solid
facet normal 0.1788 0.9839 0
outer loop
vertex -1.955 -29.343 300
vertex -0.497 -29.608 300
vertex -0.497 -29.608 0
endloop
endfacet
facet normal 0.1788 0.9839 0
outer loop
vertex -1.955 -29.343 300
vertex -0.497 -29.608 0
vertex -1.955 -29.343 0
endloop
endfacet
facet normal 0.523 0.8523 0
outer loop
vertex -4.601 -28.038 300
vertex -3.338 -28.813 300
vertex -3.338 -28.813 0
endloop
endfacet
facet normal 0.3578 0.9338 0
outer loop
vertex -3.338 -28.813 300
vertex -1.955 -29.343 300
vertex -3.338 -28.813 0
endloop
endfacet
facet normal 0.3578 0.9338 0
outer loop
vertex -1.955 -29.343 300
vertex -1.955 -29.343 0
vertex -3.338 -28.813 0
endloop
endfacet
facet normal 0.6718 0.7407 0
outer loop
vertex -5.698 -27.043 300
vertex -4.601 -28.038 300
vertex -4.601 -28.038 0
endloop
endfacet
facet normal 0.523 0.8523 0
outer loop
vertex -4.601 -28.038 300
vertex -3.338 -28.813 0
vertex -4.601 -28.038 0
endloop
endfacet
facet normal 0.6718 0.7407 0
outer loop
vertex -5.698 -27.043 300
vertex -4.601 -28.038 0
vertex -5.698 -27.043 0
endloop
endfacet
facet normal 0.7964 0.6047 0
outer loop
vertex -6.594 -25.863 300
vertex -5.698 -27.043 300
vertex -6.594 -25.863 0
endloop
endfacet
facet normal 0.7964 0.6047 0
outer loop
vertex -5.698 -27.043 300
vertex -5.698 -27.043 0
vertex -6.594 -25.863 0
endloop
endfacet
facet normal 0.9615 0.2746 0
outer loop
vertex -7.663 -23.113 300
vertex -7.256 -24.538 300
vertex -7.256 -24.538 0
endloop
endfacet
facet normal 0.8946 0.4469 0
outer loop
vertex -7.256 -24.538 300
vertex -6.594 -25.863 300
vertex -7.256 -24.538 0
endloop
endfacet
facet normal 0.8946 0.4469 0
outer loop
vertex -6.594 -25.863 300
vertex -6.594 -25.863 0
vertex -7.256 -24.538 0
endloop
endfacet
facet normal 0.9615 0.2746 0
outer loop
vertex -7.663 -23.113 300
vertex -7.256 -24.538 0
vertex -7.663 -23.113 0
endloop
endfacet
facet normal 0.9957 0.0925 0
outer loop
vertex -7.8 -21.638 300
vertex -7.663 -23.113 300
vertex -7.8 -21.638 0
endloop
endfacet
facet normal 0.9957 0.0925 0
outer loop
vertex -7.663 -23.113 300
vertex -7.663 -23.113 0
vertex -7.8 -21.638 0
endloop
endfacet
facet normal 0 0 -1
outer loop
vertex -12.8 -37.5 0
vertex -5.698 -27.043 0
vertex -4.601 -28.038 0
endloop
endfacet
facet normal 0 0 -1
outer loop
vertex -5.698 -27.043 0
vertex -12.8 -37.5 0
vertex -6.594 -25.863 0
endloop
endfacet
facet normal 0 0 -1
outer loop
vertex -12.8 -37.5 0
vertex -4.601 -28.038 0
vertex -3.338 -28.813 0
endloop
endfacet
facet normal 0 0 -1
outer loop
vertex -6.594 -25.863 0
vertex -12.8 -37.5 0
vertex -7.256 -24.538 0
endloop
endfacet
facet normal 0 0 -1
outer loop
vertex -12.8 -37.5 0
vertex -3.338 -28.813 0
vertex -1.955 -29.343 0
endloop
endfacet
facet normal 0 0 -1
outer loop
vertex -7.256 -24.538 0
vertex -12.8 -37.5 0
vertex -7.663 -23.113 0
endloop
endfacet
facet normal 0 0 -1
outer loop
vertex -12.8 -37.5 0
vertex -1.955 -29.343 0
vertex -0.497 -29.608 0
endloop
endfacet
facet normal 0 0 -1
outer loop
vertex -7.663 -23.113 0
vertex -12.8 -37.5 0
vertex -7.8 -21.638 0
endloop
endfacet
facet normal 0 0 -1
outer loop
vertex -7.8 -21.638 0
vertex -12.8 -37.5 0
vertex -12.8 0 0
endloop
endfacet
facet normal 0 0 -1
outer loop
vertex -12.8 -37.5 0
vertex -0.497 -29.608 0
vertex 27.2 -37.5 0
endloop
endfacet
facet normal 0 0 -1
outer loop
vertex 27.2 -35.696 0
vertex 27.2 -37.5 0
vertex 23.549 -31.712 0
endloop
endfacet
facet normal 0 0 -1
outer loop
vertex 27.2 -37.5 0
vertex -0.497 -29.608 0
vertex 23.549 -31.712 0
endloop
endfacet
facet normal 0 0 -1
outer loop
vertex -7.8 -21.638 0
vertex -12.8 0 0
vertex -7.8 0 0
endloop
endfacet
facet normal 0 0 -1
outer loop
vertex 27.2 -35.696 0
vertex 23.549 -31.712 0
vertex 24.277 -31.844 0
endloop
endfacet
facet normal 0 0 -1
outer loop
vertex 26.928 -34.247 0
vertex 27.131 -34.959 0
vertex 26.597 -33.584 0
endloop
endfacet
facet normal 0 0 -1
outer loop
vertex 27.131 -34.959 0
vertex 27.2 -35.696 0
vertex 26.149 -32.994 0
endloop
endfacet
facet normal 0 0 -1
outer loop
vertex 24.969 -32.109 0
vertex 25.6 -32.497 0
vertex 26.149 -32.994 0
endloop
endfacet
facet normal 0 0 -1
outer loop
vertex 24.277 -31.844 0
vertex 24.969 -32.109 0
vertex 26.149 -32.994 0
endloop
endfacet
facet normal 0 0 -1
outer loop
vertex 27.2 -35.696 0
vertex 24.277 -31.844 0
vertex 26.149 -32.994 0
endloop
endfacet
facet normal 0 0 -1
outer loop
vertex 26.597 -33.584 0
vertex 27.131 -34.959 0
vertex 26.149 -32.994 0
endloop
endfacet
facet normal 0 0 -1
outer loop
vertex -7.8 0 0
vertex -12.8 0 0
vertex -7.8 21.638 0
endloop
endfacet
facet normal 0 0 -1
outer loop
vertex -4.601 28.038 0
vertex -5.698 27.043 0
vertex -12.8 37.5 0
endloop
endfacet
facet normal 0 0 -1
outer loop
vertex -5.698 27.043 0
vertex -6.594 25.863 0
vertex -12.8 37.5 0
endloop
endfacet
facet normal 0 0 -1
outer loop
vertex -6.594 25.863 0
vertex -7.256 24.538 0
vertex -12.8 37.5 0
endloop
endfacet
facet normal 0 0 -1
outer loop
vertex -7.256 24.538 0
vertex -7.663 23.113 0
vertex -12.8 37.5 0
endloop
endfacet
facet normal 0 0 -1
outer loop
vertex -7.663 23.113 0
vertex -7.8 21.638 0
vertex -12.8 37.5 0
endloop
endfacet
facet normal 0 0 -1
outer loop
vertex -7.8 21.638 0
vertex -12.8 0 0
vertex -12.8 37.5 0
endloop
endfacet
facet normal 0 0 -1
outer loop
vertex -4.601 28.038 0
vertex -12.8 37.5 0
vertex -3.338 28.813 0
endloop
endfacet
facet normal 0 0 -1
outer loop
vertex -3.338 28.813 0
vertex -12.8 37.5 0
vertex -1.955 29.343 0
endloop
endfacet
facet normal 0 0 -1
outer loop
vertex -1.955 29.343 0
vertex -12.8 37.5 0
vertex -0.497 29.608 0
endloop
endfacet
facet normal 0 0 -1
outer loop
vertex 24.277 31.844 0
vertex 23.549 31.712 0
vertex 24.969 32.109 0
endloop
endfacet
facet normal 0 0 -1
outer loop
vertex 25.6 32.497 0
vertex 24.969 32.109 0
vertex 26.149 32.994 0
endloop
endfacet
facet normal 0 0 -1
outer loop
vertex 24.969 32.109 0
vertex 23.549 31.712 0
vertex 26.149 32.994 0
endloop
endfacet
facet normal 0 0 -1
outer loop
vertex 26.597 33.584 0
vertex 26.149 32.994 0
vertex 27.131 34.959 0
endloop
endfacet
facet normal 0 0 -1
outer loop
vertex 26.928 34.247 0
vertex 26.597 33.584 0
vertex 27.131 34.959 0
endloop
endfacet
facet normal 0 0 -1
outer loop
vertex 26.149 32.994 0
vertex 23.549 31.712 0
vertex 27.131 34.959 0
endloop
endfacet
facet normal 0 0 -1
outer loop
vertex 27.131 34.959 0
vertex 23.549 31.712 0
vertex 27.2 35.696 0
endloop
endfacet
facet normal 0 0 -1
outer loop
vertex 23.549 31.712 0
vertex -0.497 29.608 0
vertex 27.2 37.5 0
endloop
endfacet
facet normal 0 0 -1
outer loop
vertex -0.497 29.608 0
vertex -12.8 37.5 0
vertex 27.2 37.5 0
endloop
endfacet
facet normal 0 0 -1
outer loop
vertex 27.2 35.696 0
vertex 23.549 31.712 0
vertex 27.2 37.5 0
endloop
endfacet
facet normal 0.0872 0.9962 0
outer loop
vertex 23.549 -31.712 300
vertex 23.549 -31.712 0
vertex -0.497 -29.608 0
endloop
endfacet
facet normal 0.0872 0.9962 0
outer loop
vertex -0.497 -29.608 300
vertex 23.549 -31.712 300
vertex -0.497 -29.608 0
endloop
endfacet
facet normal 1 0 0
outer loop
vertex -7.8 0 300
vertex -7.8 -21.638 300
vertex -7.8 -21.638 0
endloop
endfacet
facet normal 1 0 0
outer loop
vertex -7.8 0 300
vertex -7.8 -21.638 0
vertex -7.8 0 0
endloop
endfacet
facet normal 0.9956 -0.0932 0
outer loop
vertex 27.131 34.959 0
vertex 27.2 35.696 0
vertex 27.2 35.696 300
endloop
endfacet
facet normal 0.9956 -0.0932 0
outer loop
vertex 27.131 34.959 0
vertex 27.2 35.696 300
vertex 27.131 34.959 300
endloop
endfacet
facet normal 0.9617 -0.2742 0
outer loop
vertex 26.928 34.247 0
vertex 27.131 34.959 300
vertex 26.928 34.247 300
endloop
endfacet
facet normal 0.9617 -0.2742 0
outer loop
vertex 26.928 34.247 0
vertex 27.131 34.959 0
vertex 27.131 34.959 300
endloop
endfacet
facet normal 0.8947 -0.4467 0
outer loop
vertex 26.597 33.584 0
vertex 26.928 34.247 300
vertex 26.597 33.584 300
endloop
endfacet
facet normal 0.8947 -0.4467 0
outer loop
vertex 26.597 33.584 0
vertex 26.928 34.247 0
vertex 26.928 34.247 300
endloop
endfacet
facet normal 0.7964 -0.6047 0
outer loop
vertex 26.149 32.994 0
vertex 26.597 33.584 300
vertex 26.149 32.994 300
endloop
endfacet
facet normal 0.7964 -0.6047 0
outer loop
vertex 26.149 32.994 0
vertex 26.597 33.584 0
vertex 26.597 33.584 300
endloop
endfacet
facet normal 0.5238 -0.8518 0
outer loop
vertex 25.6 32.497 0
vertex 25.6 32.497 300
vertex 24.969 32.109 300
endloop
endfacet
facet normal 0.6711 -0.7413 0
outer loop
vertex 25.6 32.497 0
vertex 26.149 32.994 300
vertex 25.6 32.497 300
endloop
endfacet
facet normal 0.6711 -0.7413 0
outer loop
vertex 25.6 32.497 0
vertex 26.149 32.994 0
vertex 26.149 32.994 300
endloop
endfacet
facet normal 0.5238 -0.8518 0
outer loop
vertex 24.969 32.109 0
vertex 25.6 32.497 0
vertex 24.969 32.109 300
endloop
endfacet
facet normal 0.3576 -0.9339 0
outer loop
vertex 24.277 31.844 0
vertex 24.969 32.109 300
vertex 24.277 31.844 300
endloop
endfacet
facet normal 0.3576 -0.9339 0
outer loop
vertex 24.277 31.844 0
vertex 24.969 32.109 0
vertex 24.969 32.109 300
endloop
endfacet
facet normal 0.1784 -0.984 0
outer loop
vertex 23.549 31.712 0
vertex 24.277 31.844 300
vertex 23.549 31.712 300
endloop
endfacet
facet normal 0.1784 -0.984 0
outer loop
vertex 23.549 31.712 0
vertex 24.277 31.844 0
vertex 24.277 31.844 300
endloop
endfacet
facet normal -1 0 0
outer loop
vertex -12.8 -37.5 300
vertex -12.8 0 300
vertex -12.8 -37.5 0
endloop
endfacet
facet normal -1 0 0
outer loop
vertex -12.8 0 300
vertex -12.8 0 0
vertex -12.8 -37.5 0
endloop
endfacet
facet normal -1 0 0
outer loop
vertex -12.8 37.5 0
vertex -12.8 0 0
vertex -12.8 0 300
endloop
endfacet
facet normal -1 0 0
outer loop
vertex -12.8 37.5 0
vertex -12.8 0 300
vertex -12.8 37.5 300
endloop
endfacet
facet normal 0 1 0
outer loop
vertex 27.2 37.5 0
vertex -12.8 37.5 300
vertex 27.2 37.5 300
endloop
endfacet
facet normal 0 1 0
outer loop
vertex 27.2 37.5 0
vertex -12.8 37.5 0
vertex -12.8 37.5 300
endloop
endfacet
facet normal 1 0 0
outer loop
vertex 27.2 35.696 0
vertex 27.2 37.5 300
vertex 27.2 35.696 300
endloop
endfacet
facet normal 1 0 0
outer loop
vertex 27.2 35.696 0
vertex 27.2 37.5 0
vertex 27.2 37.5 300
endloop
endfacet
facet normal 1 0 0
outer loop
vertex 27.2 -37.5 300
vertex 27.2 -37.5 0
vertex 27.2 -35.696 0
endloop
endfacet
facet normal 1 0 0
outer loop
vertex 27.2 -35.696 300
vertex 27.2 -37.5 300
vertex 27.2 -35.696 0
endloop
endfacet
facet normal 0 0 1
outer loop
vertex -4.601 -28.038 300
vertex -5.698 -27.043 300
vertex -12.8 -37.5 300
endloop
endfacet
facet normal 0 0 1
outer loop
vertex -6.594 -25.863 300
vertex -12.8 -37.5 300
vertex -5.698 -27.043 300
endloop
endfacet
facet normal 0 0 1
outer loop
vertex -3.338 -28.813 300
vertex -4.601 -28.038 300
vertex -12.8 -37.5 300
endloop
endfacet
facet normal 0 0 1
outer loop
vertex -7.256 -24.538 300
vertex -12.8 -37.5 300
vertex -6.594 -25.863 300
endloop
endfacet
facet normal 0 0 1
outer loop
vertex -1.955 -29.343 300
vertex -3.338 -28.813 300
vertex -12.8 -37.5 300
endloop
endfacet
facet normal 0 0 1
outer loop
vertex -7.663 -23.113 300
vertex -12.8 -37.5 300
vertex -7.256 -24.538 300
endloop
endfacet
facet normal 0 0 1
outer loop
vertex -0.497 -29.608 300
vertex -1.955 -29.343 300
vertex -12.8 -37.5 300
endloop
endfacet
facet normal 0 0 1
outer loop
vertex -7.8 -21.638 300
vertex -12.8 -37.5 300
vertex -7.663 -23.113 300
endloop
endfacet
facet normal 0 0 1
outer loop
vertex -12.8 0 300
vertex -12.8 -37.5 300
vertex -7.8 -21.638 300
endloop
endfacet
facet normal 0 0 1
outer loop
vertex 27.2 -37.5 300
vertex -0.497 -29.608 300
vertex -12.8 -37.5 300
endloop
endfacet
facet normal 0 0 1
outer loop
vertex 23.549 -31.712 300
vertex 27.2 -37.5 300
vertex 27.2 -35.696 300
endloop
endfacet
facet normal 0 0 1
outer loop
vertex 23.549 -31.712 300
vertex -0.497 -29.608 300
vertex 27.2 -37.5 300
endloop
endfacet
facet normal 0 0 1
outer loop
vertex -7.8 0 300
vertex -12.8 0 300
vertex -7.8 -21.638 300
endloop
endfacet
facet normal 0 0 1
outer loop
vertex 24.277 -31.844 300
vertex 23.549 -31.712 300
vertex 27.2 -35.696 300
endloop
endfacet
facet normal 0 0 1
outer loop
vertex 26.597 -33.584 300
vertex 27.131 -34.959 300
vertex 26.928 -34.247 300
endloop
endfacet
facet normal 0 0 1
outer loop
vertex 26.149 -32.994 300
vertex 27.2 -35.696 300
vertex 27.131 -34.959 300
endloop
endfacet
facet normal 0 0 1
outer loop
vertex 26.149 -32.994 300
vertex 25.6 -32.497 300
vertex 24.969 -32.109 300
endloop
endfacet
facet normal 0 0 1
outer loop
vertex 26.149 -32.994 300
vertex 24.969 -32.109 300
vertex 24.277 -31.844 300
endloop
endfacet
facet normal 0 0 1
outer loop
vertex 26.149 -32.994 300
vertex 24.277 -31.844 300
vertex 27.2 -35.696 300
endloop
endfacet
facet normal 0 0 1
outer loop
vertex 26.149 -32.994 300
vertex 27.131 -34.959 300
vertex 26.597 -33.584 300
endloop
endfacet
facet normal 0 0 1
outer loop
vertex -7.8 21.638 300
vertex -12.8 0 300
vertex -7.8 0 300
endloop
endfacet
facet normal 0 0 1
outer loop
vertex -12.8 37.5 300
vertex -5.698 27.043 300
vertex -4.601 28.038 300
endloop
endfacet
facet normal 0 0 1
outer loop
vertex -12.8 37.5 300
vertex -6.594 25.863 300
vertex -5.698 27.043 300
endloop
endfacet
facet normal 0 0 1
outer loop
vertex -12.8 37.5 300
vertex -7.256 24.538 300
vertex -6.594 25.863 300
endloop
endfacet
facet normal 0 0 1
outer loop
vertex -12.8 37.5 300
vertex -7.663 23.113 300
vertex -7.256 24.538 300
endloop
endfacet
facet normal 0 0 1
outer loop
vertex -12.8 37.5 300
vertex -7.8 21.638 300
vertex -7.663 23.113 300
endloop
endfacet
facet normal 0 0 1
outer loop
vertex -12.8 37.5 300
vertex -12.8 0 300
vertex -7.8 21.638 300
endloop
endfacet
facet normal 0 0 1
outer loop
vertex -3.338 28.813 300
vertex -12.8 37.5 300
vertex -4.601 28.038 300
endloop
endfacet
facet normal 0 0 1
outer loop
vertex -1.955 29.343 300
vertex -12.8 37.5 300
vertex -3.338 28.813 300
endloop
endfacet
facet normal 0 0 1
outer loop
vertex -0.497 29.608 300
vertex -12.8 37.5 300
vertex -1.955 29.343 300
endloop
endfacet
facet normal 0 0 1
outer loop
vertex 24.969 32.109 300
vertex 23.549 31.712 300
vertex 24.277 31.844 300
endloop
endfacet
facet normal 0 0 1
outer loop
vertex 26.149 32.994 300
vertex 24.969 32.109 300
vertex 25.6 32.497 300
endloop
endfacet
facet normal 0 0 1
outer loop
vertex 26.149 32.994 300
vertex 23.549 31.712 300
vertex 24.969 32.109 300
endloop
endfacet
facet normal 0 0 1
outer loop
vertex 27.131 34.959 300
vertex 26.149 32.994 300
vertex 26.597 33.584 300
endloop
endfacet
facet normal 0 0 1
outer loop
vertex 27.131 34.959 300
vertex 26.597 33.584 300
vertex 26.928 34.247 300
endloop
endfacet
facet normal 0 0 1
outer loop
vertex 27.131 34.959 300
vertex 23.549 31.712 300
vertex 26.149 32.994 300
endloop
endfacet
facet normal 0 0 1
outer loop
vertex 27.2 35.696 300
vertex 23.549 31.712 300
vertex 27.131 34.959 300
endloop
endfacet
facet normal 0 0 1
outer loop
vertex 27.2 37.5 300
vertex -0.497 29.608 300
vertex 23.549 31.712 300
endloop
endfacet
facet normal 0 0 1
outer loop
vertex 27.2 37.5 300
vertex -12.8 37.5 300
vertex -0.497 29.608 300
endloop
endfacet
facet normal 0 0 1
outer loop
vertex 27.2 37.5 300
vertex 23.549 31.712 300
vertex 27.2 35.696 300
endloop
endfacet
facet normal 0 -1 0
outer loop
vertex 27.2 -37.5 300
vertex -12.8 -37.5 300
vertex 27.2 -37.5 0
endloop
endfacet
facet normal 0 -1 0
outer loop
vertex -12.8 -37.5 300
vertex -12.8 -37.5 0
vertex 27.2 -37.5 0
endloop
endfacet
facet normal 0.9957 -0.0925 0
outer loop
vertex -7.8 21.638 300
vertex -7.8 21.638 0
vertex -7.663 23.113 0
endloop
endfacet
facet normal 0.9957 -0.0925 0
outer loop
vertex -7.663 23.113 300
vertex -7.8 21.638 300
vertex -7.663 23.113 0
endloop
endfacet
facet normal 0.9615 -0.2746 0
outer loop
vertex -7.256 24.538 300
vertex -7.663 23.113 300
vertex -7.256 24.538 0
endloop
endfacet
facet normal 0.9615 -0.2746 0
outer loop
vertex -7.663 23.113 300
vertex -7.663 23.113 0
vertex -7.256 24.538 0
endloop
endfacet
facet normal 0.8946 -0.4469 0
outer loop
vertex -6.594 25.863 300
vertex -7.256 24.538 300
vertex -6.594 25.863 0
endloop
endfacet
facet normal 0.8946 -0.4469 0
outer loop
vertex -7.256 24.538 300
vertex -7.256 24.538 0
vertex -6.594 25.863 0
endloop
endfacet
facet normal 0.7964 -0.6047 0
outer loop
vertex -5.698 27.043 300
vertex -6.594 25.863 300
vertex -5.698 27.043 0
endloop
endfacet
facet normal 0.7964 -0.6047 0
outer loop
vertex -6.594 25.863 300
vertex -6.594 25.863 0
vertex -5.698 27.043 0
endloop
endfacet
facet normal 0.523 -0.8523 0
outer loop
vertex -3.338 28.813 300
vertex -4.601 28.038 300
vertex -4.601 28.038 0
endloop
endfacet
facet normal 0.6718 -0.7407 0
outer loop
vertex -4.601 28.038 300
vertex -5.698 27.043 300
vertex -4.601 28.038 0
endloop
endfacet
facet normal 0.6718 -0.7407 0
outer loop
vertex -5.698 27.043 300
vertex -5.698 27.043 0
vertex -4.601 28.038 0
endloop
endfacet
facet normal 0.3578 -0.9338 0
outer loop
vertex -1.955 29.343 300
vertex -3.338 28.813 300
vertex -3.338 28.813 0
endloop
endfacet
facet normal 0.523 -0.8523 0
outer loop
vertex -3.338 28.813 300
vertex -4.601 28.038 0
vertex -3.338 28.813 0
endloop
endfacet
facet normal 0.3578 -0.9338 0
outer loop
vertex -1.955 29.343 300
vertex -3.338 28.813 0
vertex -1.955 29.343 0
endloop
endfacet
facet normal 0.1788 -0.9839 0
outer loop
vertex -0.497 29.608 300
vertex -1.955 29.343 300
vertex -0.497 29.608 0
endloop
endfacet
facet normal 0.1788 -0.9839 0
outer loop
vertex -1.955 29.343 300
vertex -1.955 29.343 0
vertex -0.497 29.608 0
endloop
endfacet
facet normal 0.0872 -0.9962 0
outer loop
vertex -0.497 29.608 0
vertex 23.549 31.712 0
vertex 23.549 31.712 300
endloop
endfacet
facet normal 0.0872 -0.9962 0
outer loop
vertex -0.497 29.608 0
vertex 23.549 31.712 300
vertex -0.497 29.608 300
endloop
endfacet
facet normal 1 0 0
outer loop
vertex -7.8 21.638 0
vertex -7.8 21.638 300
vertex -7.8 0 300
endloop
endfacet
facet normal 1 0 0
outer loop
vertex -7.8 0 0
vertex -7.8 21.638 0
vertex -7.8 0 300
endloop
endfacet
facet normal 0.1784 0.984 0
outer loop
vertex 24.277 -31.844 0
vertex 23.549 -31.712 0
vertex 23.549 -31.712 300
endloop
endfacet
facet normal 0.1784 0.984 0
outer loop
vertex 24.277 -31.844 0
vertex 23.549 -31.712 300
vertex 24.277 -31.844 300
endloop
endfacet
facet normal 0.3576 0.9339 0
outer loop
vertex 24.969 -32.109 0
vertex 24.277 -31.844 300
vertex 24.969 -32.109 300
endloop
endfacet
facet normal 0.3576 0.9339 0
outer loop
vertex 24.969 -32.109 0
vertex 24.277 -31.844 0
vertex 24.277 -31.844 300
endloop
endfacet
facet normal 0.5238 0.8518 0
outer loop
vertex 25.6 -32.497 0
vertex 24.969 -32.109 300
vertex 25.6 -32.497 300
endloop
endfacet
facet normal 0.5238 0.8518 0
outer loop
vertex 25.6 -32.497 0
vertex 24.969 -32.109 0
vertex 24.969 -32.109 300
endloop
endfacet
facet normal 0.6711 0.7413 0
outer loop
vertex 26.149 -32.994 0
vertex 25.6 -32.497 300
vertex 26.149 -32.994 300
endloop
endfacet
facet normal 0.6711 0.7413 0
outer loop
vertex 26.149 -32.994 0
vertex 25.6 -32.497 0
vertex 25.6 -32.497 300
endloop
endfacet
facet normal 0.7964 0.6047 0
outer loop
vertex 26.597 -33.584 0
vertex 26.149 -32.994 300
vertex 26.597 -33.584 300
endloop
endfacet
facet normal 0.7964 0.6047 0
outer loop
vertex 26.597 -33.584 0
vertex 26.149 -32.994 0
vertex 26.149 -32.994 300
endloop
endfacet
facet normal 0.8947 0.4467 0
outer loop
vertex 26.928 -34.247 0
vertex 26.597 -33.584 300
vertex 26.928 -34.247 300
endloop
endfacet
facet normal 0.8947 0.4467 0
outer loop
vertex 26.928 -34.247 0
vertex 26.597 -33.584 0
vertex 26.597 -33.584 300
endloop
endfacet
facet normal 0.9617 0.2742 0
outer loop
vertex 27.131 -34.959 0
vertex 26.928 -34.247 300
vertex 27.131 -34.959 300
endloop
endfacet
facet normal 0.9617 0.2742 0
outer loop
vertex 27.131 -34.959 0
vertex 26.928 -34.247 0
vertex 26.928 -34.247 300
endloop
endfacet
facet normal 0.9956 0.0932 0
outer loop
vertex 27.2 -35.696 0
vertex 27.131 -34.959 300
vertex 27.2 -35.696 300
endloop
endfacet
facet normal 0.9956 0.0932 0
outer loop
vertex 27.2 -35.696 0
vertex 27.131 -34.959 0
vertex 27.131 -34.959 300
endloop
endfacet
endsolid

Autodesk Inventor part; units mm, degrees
ref_plane "YZ Plane" through (0, 0, 0) normal (1, 0, 0) x (0, 1, 0)
ref_plane "開始平面" through (0, 0, 0) normal (0, 0, 1) x (1, 0, 0)
ref_plane "終了平面" through (0, 0, 300) normal (0, 0, 1) x (1, 0, 0)
sketch "スケッチ" plane through (0, 0, 0) normal (0, 0, 1) x (1, 0, 0)
  line L0 (-12.8, 0) -> (-12.8, 37.5)
  line L1 (-12.8, 37.5) -> (27.2, 37.5)
  line L2 (27.2, 37.5) -> (27.2, 35.6964)
  line L3 (23.5486, 31.7116) -> (-0.4973, 29.6078)
  line L4 (-7.8, 21.6383) -> (-7.8, 0)
  line L5 (-7.8, 0) -> (-12.8, 0) construction
  line L6 (9.7, 37.5) -> (9.7, 30.5) construction
  line L7 (27.2, 32.0311) -> (27.2, 30.5) construction
  line L8 (27.2, 30.5) -> (9.7, 30.5) construction
  line L9 (0, 15) -> (0, -27) construction
  line L10 (-5.539, 0) -> (16.0067, 0) construction
  line L11 (-12.8, 0) -> (-12.8, -37.5)
  line L12 (-12.8, -37.5) -> (27.2, -37.5)
  line L13 (27.2, -37.5) -> (27.2, -35.6964)
  line L14 (23.5486, -31.7116) -> (-0.4973, -29.6078)
  line L15 (-7.8, -21.6383) -> (-7.8, 0)
  arc A0 (-0.4973, 29.6078) -> (-7.8, 21.6383) centre (0.2, 21.6383) ccw
  arc A1 (-7.8, -21.6383) -> (-0.4973, -29.6078) centre (0.2, -21.6383) ccw
  arc A2 (23.5486, 31.7116) -> (27.2, 35.6964) centre (23.2, 35.6964) ccw
  arc A3 (27.2, -35.6964) -> (23.5486, -31.7116) centre (23.2, -35.6964) ccw
  line L16 (0, 52.5) -> (0, -52.5) construction
  line L17 (-20.955, 0) -> (36.1298, 0) construction
  point P0 (-7.8, 28.9689)
  point P1 (27.2, -32.0311)
  point P2 (-7.8, -28.9689)
  point P3 (9.7, -37.5)
  point P4 (9.7, -30.5)
  dimension "d0" = 5
  dimension "d1" = 37.5
  dimension "d2" = 40
  dimension "d3" = 7
  dimension "d4" = 17.5
  dimension "d5" = 1.5311
  dimension "d23" = 8
  dimension "d24" = 4
  dimension "d25" = 12.8
extrude "ボディ" add sketch "スケッチ" along normal up to surface (300 mm away) from surface at 0
sketch "Sketch3" plane through (0, 0, 0) normal (0, 0, 1) x (1, 0, 0)
  line L0 (0, 0) -> (10, 0)
ref_plane "Work Plane3" through (0, 0, 0) normal (0, -1, 0) x (1, 0, 0)
sketch "Sketch4" plane through (0, 0, 0) normal (0, -1, 0) x (1, 0, 0)
  line L0 (-2, 0) -> (12, 0)
  line L1 (-2, 300) -> (12, 300)
  dimension "d29" = 300
equation "\"d0\" = G_T"
equation "\"d1\" = 0.5 * G_H"
equation "\"d2\" = G_W"
equation "\"d3\" = G_T1"
equation "\"d4\" = G_C"
equation "\"d23\" = G_IR"
equation "\"d24\" = G_ER"
equation "\"d25\" = ey"
equation "\"d6\" = G_L"
equation "\"G_W\" = 40"
equation "\"G_H\" = 75"
equation "\"G_T\" = 5"
equation "\"G_T1\" = 7"
equation "\"G_NG\" = 0.08749"
equation "\"G_ER\" = 4"
equation "\"G_IR\" = 8"
equation "\"G_C\" = 17.5"
equation "\"G_L\" = d29"
equation "\"ey\" = 12.8"
equation "\"G_OFFSET_START\" = 0"
equation "\"G_OFFSET_END\" = 0"
properties part number "JIS G 3192 - 75 x 40 x 5 - 300" material "SS400"
